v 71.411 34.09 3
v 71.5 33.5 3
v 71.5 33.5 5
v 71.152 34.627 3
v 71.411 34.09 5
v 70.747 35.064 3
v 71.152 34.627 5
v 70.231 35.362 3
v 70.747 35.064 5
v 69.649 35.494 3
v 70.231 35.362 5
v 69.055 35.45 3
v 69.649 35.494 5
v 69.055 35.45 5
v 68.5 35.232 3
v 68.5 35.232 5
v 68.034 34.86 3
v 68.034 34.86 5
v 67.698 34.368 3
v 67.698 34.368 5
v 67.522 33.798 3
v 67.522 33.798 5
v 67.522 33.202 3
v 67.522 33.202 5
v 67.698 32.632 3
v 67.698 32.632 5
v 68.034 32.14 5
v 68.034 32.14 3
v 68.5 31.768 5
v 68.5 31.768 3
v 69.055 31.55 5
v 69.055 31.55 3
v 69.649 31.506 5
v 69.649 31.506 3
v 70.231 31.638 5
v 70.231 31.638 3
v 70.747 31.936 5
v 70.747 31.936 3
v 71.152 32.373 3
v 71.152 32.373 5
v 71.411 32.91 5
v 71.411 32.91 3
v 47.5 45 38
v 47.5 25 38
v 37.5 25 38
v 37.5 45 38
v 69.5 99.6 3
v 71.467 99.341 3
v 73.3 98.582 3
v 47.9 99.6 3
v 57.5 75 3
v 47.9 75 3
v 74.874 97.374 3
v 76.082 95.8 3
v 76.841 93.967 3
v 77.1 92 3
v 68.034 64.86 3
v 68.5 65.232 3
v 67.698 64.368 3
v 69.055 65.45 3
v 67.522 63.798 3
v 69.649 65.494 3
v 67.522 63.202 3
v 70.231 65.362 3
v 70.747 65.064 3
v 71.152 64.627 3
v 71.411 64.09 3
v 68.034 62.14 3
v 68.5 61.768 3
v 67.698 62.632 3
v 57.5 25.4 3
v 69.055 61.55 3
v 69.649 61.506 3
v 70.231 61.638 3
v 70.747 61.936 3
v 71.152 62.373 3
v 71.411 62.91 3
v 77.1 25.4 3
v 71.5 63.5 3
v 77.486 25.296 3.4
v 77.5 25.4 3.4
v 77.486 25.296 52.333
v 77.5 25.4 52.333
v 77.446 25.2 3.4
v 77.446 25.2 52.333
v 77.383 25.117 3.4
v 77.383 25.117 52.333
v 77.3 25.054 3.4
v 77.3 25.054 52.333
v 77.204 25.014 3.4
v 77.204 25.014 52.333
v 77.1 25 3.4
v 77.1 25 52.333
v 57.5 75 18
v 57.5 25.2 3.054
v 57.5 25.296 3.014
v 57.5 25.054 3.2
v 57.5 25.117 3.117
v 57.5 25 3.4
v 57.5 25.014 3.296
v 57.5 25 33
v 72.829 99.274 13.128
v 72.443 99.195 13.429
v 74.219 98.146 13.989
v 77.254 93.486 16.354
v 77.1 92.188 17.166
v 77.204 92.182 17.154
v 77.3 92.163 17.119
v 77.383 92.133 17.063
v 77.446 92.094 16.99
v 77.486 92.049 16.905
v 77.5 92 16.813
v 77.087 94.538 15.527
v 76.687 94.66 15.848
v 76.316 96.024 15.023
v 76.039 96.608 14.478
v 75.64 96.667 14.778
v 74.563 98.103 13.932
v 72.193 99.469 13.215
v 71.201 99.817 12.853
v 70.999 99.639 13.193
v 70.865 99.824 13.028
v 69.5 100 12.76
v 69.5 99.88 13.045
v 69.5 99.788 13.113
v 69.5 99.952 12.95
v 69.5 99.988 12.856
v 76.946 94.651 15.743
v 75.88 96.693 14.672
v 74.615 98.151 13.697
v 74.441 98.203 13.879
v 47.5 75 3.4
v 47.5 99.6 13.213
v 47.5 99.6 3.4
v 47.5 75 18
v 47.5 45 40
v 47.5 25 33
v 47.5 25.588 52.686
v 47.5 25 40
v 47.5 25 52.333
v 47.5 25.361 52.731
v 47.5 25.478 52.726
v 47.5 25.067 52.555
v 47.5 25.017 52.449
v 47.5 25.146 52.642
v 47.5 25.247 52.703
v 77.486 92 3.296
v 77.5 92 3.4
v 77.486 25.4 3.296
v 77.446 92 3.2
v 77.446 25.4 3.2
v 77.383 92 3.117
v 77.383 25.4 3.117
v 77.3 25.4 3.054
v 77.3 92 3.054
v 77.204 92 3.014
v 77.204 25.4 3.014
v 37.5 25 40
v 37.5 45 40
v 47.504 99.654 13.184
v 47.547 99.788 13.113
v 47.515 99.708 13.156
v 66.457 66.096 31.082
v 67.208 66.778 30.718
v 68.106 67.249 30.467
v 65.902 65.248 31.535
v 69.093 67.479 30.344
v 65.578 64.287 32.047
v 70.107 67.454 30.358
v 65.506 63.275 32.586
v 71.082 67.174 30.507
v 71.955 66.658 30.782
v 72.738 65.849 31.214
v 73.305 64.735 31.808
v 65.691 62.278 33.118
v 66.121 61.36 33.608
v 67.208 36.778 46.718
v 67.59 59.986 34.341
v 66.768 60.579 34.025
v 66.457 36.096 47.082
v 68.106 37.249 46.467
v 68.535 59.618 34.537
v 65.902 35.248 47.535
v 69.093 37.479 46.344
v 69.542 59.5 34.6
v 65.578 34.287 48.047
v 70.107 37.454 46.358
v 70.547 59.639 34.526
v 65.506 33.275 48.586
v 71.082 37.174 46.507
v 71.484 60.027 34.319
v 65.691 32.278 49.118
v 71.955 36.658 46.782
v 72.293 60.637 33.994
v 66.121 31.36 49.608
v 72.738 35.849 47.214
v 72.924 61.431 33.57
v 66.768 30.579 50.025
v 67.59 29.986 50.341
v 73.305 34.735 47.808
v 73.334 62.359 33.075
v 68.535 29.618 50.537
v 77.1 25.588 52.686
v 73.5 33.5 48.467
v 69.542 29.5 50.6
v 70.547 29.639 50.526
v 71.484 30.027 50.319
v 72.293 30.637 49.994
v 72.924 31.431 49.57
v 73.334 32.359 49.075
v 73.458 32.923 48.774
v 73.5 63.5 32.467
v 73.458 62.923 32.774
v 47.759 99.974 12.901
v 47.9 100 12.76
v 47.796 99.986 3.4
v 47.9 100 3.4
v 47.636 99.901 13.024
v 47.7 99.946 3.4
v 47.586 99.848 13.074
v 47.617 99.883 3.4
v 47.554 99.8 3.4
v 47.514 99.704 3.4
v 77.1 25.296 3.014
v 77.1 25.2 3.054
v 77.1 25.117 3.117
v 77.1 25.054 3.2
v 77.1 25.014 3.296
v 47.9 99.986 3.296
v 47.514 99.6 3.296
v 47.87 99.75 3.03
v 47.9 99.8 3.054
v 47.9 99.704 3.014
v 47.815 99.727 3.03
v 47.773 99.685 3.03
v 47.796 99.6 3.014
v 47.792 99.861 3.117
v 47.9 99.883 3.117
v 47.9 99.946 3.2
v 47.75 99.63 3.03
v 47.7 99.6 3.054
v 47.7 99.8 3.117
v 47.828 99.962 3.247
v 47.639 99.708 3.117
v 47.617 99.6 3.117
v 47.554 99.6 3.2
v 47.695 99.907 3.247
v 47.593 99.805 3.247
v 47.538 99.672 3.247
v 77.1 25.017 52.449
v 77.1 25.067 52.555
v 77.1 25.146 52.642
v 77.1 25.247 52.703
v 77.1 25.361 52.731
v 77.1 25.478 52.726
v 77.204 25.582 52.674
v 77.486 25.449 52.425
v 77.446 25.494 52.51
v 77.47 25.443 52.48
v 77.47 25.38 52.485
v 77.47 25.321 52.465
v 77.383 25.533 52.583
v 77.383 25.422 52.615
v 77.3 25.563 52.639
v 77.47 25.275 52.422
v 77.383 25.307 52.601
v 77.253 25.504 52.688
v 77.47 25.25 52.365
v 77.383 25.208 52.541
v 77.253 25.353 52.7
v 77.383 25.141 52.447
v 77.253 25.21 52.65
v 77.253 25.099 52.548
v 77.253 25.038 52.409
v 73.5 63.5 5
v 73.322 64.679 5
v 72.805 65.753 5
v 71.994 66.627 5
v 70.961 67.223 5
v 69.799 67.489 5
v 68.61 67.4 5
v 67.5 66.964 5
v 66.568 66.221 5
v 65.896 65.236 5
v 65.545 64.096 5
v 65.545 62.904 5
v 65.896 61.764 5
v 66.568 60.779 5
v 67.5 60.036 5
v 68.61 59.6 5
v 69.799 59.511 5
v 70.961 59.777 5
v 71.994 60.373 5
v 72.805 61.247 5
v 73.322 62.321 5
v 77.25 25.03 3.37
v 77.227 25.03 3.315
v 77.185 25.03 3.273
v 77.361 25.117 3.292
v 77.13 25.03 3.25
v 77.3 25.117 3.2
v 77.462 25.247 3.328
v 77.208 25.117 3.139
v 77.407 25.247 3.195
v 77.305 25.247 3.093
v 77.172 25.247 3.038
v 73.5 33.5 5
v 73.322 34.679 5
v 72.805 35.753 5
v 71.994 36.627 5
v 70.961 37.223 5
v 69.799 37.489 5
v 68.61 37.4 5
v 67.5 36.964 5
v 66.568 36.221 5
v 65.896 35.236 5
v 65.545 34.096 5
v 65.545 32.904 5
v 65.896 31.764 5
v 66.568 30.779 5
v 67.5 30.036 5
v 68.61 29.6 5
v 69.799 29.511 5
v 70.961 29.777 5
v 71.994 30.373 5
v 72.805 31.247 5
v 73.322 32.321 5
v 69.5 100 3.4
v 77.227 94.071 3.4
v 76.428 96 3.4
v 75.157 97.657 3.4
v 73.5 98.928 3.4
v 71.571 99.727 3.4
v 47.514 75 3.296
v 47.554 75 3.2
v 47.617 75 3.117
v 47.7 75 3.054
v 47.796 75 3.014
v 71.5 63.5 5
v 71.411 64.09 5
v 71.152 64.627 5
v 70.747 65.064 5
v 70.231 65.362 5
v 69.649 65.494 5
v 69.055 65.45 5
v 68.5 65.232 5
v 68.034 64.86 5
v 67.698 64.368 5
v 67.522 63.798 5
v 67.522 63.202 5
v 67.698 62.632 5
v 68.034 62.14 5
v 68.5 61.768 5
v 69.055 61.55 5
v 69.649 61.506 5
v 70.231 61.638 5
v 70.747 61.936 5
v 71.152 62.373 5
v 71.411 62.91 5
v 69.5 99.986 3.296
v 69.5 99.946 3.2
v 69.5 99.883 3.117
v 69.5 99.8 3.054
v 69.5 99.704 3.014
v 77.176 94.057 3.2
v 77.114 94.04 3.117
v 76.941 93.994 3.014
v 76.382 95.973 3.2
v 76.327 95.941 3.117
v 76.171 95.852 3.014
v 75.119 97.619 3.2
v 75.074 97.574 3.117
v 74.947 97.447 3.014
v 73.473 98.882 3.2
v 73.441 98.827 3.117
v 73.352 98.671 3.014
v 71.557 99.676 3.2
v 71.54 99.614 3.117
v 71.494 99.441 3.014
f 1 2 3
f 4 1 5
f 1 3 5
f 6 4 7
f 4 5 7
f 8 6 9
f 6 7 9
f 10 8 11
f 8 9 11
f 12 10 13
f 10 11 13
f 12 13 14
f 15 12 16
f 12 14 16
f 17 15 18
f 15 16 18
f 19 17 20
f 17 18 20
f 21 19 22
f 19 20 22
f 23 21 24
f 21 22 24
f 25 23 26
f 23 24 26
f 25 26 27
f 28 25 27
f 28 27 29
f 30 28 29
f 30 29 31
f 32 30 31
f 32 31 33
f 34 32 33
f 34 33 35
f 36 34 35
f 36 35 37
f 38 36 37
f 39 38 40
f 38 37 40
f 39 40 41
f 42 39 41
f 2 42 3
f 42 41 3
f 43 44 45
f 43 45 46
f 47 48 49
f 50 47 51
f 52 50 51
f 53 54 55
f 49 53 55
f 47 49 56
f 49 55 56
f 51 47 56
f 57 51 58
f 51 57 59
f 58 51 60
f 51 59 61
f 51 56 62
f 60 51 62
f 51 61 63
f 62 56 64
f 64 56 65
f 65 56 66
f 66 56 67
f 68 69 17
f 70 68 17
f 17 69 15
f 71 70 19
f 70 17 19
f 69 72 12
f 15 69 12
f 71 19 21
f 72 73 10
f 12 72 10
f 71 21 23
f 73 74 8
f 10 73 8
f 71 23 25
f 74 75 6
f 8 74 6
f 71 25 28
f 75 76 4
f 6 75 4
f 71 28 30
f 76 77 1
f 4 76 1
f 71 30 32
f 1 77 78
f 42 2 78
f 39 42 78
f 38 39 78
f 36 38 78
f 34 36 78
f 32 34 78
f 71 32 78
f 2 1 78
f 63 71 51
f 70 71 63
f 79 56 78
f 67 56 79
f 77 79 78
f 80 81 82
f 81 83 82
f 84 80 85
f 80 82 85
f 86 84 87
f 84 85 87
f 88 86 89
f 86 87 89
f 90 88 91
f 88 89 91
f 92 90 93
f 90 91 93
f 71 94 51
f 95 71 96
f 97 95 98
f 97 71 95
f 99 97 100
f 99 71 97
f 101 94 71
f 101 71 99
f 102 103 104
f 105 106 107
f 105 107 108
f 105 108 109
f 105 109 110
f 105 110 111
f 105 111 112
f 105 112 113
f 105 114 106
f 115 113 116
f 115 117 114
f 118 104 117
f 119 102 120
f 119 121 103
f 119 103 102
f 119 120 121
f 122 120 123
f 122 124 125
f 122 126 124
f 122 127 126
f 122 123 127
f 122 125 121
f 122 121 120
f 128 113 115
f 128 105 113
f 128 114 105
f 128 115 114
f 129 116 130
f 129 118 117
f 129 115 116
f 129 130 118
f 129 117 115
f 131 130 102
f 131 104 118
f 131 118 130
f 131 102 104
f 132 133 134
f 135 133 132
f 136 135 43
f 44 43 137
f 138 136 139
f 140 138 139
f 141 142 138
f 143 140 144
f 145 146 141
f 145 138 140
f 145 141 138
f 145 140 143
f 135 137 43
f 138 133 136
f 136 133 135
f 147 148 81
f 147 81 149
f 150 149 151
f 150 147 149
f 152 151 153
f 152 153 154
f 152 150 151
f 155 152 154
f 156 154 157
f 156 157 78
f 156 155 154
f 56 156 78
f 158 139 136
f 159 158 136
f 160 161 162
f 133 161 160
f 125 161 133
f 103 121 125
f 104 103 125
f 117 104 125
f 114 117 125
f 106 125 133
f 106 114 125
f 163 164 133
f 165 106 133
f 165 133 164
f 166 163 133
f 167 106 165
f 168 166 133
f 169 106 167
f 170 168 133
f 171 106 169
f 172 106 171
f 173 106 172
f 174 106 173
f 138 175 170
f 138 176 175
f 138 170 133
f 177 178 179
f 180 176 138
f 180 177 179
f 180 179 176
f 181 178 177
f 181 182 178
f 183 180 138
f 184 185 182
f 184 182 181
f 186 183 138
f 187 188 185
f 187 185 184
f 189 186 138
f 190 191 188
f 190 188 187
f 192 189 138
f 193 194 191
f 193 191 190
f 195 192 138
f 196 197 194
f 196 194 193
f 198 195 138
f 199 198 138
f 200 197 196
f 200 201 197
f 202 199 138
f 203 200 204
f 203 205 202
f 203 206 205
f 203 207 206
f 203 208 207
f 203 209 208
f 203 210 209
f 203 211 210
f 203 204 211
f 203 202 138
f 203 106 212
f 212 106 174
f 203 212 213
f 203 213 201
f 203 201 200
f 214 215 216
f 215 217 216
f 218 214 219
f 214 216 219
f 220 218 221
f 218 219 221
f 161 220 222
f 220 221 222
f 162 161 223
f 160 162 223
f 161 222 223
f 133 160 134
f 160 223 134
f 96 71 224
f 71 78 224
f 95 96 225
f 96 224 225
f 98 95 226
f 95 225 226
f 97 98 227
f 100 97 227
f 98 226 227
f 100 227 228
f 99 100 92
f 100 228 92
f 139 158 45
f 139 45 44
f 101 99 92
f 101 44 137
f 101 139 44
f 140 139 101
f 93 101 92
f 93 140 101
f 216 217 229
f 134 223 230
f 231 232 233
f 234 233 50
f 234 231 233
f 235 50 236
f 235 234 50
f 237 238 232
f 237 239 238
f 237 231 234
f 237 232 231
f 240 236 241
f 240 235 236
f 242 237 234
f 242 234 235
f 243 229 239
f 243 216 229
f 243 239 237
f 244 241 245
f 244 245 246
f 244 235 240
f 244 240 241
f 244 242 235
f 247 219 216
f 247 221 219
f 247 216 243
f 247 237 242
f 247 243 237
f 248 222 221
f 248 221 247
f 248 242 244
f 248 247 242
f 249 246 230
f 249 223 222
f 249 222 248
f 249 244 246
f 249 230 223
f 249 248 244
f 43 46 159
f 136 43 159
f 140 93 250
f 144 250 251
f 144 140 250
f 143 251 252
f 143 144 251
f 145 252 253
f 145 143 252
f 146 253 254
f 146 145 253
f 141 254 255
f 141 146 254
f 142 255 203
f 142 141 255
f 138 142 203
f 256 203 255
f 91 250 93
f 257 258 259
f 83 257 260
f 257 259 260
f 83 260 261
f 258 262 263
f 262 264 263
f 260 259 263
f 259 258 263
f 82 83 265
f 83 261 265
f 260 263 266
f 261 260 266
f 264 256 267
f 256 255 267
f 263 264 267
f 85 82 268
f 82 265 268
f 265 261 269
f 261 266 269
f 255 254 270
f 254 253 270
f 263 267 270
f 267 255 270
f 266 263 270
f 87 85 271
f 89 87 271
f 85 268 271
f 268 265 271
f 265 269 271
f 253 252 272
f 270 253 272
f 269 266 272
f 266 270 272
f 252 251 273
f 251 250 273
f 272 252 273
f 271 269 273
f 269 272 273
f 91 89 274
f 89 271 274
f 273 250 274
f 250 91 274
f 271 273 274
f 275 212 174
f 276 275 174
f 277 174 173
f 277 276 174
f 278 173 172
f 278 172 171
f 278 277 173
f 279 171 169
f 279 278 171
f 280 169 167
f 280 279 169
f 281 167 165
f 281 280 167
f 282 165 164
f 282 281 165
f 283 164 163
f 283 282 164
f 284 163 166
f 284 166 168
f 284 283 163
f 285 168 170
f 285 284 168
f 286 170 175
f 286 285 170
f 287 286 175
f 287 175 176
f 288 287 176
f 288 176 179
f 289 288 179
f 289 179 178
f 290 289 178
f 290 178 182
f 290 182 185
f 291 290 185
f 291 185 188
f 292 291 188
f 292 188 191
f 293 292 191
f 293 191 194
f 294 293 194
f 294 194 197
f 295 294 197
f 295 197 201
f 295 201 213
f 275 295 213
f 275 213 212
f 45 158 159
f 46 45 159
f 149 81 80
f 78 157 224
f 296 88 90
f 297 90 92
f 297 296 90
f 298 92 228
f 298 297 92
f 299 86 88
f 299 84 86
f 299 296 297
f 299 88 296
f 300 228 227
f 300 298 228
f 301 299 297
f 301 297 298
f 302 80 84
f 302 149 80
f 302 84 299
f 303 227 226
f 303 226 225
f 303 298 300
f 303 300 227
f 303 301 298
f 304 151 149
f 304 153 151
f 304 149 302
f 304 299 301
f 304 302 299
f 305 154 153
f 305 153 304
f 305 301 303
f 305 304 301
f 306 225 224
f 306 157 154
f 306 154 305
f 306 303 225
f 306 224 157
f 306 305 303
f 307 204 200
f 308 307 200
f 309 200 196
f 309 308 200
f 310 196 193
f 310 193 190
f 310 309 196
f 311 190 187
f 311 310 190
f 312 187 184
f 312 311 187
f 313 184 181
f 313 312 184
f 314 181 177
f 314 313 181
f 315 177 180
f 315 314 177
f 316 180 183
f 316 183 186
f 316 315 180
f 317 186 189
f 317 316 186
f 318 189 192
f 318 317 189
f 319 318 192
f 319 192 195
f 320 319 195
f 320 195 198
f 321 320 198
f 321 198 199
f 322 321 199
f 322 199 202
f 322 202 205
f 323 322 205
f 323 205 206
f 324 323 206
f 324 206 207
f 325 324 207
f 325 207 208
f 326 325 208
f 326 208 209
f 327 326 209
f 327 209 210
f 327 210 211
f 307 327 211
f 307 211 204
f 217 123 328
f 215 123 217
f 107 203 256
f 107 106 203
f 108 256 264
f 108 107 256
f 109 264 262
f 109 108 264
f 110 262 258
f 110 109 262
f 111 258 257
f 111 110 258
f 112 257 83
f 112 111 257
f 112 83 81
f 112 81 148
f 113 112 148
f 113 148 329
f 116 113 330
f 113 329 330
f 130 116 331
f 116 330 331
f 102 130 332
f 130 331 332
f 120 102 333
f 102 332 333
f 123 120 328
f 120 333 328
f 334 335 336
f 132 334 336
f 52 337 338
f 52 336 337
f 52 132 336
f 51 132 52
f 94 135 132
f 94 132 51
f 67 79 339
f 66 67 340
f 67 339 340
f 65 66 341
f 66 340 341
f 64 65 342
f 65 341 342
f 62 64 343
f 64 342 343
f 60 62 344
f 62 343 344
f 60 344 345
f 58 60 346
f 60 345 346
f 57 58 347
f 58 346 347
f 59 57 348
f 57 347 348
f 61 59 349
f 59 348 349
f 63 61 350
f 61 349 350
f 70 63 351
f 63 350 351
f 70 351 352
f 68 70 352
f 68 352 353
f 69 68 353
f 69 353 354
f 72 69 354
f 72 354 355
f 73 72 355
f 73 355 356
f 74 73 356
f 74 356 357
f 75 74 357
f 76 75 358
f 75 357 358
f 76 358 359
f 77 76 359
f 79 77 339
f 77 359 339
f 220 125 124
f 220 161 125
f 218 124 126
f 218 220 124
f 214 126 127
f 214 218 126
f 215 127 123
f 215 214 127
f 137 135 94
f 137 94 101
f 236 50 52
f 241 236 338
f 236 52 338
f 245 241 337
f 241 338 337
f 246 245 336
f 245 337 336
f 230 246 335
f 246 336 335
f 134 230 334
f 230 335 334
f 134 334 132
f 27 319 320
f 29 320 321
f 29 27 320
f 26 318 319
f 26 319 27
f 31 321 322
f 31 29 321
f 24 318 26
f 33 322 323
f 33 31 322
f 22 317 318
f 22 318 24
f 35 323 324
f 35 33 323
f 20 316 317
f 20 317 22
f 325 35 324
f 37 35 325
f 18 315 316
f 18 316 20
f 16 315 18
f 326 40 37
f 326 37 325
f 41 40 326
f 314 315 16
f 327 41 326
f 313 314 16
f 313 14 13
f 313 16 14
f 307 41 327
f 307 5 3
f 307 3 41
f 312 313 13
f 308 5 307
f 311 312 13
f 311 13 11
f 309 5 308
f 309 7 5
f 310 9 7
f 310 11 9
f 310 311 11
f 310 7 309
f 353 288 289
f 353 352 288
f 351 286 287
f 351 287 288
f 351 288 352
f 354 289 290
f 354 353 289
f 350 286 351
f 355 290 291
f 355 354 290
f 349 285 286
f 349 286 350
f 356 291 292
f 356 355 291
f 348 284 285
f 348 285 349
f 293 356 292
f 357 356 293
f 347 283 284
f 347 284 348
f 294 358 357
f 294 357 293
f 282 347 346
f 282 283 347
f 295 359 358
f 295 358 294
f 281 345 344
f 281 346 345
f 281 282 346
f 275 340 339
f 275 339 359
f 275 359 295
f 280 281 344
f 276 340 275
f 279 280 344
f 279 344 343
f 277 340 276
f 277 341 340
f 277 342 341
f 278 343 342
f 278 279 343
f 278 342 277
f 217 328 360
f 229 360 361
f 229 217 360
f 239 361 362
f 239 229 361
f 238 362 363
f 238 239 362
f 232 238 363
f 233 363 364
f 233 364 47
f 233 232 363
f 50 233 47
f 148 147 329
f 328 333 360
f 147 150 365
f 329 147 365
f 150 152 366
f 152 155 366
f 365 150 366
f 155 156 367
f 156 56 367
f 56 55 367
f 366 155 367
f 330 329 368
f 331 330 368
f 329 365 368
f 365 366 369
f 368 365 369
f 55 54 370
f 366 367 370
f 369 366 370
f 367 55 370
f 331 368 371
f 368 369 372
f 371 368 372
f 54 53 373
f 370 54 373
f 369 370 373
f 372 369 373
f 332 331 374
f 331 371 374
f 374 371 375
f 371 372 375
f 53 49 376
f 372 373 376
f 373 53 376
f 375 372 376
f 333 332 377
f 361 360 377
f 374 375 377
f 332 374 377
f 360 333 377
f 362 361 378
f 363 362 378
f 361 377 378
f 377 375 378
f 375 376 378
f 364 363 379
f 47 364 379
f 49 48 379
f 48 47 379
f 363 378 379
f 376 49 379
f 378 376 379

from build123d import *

# Parameters (mm, degrees)
PAD005_DEPTH    = 30
POCKET007_DEPTH = 10
SKETCH019_W     = 20
SKETCH019_H     = 2
PAD006_DEPTH    = 10
PAD018_DEPTH    = 10
SKETCH016_R     = 2
POCKET005_DEPTH = 2.001
SKETCH017_R     = 4
POCKET006_DEPTH = 48.001
FILLET002_R     = 8
FILLET003_R     = 0.4


with BuildPart() as rearhullleftbody:
    # Sketch015 → Pad005 (new body)
    with BuildSketch(Plane.YZ):
        Polygon((0, 40), (0, 0), (75, 0), align=None)
    extrude(amount=PAD005_DEPTH)

    # Sketch018 (on Face5 of Pad005) → Pocket007 (cut)
    with BuildSketch(Plane.YZ.offset(30)):
        Polygon((0, 20), (0, 0), (50, 0), (50, 5), align=None)
    extrude(amount=-POCKET007_DEPTH, mode=Mode.SUBTRACT)

    # Sketch019 (on Face6 of Pocket007) → Pad006 (join)
    with BuildSketch(Plane.YZ.offset(30)):
        with Locations((10, 26)):
            Rectangle(SKETCH019_W, SKETCH019_H)
    extrude(amount=PAD006_DEPTH)

    # Pad006 Face2 → Pad018 (add)
    with BuildSketch(Plane(origin=(12.142857, 41.071429, 0), x_dir=(0, -1, 0), z_dir=(0, 0, -1))):
        Polygon((41.071429, 12.142857), (-33.928571, 12.142857), (-33.928571, -17.857143), (-8.928571, -17.857143), (-8.928571, -7.857143), (41.071429, -7.857143), align=None)
    extrude(amount=PAD018_DEPTH)

    # Sketch016 (on DatumPlane) → Pocket005 (cut, through all)
    with BuildSketch(Plane(origin=(0, 0, -8), x_dir=(-1, 0, 0), z_dir=(0, 0, -1))):
        with Locations((-8, 38.5)):
            Circle(SKETCH016_R)
        with Locations((-8, 8.5)):
            Circle(SKETCH016_R)
    extrude(amount=POCKET005_DEPTH, mode=Mode.SUBTRACT)

    # Sketch017 (on DatumPlane) → Pocket006 (cut, through all)
    with BuildSketch(Plane(origin=(0, 0, -8), x_dir=(-1, 0, 0), z_dir=(0, 0, -1))):
        with Locations((-8, 8.5)):
            Circle(SKETCH017_R)
        with Locations((-8, 38.5)):
            Circle(SKETCH017_R)
    extrude(amount=-POCKET006_DEPTH, mode=Mode.SUBTRACT)

    # Fillet002
    fillet002_edges = [rearhullleftbody.edges().sort_by_distance(p)[0] for p in [
        (0, 75, -5),
    ]]
    fillet(fillet002_edges, radius=FILLET002_R)

    # Fillet003
    fillet003_edges = [rearhullleftbody.edges().sort_by_distance(p)[0] for p in [
        (30, 75, -5),
        (0, 33.5, -10),
        (0, 0, 15),
        (10, 0, -10),
        (15, 0, 40),
        (19, 75, -10),
        (19, 75, 0),
        (0, 33.5, 22.133333),
        (30, 62.5, -10),
    ]]
    fillet(fillet003_edges, radius=FILLET003_R)


with BuildPart() as rearhullleftbody_1:
    # Body006 placement: moved
    add(rearhullleftbody.part.moved(Location((-77.5, 25, 13))))


with BuildPart() as part_mirroring001:
    # Part__Mirroring001: instance of RearHullLeftBody
    add(rearhullleftbody_1.part.mirror(Plane(origin=(0, 0, 0), x_dir=(0, -1, 0), z_dir=(1, 0, 0))))


solid = part_mirroring001.part
